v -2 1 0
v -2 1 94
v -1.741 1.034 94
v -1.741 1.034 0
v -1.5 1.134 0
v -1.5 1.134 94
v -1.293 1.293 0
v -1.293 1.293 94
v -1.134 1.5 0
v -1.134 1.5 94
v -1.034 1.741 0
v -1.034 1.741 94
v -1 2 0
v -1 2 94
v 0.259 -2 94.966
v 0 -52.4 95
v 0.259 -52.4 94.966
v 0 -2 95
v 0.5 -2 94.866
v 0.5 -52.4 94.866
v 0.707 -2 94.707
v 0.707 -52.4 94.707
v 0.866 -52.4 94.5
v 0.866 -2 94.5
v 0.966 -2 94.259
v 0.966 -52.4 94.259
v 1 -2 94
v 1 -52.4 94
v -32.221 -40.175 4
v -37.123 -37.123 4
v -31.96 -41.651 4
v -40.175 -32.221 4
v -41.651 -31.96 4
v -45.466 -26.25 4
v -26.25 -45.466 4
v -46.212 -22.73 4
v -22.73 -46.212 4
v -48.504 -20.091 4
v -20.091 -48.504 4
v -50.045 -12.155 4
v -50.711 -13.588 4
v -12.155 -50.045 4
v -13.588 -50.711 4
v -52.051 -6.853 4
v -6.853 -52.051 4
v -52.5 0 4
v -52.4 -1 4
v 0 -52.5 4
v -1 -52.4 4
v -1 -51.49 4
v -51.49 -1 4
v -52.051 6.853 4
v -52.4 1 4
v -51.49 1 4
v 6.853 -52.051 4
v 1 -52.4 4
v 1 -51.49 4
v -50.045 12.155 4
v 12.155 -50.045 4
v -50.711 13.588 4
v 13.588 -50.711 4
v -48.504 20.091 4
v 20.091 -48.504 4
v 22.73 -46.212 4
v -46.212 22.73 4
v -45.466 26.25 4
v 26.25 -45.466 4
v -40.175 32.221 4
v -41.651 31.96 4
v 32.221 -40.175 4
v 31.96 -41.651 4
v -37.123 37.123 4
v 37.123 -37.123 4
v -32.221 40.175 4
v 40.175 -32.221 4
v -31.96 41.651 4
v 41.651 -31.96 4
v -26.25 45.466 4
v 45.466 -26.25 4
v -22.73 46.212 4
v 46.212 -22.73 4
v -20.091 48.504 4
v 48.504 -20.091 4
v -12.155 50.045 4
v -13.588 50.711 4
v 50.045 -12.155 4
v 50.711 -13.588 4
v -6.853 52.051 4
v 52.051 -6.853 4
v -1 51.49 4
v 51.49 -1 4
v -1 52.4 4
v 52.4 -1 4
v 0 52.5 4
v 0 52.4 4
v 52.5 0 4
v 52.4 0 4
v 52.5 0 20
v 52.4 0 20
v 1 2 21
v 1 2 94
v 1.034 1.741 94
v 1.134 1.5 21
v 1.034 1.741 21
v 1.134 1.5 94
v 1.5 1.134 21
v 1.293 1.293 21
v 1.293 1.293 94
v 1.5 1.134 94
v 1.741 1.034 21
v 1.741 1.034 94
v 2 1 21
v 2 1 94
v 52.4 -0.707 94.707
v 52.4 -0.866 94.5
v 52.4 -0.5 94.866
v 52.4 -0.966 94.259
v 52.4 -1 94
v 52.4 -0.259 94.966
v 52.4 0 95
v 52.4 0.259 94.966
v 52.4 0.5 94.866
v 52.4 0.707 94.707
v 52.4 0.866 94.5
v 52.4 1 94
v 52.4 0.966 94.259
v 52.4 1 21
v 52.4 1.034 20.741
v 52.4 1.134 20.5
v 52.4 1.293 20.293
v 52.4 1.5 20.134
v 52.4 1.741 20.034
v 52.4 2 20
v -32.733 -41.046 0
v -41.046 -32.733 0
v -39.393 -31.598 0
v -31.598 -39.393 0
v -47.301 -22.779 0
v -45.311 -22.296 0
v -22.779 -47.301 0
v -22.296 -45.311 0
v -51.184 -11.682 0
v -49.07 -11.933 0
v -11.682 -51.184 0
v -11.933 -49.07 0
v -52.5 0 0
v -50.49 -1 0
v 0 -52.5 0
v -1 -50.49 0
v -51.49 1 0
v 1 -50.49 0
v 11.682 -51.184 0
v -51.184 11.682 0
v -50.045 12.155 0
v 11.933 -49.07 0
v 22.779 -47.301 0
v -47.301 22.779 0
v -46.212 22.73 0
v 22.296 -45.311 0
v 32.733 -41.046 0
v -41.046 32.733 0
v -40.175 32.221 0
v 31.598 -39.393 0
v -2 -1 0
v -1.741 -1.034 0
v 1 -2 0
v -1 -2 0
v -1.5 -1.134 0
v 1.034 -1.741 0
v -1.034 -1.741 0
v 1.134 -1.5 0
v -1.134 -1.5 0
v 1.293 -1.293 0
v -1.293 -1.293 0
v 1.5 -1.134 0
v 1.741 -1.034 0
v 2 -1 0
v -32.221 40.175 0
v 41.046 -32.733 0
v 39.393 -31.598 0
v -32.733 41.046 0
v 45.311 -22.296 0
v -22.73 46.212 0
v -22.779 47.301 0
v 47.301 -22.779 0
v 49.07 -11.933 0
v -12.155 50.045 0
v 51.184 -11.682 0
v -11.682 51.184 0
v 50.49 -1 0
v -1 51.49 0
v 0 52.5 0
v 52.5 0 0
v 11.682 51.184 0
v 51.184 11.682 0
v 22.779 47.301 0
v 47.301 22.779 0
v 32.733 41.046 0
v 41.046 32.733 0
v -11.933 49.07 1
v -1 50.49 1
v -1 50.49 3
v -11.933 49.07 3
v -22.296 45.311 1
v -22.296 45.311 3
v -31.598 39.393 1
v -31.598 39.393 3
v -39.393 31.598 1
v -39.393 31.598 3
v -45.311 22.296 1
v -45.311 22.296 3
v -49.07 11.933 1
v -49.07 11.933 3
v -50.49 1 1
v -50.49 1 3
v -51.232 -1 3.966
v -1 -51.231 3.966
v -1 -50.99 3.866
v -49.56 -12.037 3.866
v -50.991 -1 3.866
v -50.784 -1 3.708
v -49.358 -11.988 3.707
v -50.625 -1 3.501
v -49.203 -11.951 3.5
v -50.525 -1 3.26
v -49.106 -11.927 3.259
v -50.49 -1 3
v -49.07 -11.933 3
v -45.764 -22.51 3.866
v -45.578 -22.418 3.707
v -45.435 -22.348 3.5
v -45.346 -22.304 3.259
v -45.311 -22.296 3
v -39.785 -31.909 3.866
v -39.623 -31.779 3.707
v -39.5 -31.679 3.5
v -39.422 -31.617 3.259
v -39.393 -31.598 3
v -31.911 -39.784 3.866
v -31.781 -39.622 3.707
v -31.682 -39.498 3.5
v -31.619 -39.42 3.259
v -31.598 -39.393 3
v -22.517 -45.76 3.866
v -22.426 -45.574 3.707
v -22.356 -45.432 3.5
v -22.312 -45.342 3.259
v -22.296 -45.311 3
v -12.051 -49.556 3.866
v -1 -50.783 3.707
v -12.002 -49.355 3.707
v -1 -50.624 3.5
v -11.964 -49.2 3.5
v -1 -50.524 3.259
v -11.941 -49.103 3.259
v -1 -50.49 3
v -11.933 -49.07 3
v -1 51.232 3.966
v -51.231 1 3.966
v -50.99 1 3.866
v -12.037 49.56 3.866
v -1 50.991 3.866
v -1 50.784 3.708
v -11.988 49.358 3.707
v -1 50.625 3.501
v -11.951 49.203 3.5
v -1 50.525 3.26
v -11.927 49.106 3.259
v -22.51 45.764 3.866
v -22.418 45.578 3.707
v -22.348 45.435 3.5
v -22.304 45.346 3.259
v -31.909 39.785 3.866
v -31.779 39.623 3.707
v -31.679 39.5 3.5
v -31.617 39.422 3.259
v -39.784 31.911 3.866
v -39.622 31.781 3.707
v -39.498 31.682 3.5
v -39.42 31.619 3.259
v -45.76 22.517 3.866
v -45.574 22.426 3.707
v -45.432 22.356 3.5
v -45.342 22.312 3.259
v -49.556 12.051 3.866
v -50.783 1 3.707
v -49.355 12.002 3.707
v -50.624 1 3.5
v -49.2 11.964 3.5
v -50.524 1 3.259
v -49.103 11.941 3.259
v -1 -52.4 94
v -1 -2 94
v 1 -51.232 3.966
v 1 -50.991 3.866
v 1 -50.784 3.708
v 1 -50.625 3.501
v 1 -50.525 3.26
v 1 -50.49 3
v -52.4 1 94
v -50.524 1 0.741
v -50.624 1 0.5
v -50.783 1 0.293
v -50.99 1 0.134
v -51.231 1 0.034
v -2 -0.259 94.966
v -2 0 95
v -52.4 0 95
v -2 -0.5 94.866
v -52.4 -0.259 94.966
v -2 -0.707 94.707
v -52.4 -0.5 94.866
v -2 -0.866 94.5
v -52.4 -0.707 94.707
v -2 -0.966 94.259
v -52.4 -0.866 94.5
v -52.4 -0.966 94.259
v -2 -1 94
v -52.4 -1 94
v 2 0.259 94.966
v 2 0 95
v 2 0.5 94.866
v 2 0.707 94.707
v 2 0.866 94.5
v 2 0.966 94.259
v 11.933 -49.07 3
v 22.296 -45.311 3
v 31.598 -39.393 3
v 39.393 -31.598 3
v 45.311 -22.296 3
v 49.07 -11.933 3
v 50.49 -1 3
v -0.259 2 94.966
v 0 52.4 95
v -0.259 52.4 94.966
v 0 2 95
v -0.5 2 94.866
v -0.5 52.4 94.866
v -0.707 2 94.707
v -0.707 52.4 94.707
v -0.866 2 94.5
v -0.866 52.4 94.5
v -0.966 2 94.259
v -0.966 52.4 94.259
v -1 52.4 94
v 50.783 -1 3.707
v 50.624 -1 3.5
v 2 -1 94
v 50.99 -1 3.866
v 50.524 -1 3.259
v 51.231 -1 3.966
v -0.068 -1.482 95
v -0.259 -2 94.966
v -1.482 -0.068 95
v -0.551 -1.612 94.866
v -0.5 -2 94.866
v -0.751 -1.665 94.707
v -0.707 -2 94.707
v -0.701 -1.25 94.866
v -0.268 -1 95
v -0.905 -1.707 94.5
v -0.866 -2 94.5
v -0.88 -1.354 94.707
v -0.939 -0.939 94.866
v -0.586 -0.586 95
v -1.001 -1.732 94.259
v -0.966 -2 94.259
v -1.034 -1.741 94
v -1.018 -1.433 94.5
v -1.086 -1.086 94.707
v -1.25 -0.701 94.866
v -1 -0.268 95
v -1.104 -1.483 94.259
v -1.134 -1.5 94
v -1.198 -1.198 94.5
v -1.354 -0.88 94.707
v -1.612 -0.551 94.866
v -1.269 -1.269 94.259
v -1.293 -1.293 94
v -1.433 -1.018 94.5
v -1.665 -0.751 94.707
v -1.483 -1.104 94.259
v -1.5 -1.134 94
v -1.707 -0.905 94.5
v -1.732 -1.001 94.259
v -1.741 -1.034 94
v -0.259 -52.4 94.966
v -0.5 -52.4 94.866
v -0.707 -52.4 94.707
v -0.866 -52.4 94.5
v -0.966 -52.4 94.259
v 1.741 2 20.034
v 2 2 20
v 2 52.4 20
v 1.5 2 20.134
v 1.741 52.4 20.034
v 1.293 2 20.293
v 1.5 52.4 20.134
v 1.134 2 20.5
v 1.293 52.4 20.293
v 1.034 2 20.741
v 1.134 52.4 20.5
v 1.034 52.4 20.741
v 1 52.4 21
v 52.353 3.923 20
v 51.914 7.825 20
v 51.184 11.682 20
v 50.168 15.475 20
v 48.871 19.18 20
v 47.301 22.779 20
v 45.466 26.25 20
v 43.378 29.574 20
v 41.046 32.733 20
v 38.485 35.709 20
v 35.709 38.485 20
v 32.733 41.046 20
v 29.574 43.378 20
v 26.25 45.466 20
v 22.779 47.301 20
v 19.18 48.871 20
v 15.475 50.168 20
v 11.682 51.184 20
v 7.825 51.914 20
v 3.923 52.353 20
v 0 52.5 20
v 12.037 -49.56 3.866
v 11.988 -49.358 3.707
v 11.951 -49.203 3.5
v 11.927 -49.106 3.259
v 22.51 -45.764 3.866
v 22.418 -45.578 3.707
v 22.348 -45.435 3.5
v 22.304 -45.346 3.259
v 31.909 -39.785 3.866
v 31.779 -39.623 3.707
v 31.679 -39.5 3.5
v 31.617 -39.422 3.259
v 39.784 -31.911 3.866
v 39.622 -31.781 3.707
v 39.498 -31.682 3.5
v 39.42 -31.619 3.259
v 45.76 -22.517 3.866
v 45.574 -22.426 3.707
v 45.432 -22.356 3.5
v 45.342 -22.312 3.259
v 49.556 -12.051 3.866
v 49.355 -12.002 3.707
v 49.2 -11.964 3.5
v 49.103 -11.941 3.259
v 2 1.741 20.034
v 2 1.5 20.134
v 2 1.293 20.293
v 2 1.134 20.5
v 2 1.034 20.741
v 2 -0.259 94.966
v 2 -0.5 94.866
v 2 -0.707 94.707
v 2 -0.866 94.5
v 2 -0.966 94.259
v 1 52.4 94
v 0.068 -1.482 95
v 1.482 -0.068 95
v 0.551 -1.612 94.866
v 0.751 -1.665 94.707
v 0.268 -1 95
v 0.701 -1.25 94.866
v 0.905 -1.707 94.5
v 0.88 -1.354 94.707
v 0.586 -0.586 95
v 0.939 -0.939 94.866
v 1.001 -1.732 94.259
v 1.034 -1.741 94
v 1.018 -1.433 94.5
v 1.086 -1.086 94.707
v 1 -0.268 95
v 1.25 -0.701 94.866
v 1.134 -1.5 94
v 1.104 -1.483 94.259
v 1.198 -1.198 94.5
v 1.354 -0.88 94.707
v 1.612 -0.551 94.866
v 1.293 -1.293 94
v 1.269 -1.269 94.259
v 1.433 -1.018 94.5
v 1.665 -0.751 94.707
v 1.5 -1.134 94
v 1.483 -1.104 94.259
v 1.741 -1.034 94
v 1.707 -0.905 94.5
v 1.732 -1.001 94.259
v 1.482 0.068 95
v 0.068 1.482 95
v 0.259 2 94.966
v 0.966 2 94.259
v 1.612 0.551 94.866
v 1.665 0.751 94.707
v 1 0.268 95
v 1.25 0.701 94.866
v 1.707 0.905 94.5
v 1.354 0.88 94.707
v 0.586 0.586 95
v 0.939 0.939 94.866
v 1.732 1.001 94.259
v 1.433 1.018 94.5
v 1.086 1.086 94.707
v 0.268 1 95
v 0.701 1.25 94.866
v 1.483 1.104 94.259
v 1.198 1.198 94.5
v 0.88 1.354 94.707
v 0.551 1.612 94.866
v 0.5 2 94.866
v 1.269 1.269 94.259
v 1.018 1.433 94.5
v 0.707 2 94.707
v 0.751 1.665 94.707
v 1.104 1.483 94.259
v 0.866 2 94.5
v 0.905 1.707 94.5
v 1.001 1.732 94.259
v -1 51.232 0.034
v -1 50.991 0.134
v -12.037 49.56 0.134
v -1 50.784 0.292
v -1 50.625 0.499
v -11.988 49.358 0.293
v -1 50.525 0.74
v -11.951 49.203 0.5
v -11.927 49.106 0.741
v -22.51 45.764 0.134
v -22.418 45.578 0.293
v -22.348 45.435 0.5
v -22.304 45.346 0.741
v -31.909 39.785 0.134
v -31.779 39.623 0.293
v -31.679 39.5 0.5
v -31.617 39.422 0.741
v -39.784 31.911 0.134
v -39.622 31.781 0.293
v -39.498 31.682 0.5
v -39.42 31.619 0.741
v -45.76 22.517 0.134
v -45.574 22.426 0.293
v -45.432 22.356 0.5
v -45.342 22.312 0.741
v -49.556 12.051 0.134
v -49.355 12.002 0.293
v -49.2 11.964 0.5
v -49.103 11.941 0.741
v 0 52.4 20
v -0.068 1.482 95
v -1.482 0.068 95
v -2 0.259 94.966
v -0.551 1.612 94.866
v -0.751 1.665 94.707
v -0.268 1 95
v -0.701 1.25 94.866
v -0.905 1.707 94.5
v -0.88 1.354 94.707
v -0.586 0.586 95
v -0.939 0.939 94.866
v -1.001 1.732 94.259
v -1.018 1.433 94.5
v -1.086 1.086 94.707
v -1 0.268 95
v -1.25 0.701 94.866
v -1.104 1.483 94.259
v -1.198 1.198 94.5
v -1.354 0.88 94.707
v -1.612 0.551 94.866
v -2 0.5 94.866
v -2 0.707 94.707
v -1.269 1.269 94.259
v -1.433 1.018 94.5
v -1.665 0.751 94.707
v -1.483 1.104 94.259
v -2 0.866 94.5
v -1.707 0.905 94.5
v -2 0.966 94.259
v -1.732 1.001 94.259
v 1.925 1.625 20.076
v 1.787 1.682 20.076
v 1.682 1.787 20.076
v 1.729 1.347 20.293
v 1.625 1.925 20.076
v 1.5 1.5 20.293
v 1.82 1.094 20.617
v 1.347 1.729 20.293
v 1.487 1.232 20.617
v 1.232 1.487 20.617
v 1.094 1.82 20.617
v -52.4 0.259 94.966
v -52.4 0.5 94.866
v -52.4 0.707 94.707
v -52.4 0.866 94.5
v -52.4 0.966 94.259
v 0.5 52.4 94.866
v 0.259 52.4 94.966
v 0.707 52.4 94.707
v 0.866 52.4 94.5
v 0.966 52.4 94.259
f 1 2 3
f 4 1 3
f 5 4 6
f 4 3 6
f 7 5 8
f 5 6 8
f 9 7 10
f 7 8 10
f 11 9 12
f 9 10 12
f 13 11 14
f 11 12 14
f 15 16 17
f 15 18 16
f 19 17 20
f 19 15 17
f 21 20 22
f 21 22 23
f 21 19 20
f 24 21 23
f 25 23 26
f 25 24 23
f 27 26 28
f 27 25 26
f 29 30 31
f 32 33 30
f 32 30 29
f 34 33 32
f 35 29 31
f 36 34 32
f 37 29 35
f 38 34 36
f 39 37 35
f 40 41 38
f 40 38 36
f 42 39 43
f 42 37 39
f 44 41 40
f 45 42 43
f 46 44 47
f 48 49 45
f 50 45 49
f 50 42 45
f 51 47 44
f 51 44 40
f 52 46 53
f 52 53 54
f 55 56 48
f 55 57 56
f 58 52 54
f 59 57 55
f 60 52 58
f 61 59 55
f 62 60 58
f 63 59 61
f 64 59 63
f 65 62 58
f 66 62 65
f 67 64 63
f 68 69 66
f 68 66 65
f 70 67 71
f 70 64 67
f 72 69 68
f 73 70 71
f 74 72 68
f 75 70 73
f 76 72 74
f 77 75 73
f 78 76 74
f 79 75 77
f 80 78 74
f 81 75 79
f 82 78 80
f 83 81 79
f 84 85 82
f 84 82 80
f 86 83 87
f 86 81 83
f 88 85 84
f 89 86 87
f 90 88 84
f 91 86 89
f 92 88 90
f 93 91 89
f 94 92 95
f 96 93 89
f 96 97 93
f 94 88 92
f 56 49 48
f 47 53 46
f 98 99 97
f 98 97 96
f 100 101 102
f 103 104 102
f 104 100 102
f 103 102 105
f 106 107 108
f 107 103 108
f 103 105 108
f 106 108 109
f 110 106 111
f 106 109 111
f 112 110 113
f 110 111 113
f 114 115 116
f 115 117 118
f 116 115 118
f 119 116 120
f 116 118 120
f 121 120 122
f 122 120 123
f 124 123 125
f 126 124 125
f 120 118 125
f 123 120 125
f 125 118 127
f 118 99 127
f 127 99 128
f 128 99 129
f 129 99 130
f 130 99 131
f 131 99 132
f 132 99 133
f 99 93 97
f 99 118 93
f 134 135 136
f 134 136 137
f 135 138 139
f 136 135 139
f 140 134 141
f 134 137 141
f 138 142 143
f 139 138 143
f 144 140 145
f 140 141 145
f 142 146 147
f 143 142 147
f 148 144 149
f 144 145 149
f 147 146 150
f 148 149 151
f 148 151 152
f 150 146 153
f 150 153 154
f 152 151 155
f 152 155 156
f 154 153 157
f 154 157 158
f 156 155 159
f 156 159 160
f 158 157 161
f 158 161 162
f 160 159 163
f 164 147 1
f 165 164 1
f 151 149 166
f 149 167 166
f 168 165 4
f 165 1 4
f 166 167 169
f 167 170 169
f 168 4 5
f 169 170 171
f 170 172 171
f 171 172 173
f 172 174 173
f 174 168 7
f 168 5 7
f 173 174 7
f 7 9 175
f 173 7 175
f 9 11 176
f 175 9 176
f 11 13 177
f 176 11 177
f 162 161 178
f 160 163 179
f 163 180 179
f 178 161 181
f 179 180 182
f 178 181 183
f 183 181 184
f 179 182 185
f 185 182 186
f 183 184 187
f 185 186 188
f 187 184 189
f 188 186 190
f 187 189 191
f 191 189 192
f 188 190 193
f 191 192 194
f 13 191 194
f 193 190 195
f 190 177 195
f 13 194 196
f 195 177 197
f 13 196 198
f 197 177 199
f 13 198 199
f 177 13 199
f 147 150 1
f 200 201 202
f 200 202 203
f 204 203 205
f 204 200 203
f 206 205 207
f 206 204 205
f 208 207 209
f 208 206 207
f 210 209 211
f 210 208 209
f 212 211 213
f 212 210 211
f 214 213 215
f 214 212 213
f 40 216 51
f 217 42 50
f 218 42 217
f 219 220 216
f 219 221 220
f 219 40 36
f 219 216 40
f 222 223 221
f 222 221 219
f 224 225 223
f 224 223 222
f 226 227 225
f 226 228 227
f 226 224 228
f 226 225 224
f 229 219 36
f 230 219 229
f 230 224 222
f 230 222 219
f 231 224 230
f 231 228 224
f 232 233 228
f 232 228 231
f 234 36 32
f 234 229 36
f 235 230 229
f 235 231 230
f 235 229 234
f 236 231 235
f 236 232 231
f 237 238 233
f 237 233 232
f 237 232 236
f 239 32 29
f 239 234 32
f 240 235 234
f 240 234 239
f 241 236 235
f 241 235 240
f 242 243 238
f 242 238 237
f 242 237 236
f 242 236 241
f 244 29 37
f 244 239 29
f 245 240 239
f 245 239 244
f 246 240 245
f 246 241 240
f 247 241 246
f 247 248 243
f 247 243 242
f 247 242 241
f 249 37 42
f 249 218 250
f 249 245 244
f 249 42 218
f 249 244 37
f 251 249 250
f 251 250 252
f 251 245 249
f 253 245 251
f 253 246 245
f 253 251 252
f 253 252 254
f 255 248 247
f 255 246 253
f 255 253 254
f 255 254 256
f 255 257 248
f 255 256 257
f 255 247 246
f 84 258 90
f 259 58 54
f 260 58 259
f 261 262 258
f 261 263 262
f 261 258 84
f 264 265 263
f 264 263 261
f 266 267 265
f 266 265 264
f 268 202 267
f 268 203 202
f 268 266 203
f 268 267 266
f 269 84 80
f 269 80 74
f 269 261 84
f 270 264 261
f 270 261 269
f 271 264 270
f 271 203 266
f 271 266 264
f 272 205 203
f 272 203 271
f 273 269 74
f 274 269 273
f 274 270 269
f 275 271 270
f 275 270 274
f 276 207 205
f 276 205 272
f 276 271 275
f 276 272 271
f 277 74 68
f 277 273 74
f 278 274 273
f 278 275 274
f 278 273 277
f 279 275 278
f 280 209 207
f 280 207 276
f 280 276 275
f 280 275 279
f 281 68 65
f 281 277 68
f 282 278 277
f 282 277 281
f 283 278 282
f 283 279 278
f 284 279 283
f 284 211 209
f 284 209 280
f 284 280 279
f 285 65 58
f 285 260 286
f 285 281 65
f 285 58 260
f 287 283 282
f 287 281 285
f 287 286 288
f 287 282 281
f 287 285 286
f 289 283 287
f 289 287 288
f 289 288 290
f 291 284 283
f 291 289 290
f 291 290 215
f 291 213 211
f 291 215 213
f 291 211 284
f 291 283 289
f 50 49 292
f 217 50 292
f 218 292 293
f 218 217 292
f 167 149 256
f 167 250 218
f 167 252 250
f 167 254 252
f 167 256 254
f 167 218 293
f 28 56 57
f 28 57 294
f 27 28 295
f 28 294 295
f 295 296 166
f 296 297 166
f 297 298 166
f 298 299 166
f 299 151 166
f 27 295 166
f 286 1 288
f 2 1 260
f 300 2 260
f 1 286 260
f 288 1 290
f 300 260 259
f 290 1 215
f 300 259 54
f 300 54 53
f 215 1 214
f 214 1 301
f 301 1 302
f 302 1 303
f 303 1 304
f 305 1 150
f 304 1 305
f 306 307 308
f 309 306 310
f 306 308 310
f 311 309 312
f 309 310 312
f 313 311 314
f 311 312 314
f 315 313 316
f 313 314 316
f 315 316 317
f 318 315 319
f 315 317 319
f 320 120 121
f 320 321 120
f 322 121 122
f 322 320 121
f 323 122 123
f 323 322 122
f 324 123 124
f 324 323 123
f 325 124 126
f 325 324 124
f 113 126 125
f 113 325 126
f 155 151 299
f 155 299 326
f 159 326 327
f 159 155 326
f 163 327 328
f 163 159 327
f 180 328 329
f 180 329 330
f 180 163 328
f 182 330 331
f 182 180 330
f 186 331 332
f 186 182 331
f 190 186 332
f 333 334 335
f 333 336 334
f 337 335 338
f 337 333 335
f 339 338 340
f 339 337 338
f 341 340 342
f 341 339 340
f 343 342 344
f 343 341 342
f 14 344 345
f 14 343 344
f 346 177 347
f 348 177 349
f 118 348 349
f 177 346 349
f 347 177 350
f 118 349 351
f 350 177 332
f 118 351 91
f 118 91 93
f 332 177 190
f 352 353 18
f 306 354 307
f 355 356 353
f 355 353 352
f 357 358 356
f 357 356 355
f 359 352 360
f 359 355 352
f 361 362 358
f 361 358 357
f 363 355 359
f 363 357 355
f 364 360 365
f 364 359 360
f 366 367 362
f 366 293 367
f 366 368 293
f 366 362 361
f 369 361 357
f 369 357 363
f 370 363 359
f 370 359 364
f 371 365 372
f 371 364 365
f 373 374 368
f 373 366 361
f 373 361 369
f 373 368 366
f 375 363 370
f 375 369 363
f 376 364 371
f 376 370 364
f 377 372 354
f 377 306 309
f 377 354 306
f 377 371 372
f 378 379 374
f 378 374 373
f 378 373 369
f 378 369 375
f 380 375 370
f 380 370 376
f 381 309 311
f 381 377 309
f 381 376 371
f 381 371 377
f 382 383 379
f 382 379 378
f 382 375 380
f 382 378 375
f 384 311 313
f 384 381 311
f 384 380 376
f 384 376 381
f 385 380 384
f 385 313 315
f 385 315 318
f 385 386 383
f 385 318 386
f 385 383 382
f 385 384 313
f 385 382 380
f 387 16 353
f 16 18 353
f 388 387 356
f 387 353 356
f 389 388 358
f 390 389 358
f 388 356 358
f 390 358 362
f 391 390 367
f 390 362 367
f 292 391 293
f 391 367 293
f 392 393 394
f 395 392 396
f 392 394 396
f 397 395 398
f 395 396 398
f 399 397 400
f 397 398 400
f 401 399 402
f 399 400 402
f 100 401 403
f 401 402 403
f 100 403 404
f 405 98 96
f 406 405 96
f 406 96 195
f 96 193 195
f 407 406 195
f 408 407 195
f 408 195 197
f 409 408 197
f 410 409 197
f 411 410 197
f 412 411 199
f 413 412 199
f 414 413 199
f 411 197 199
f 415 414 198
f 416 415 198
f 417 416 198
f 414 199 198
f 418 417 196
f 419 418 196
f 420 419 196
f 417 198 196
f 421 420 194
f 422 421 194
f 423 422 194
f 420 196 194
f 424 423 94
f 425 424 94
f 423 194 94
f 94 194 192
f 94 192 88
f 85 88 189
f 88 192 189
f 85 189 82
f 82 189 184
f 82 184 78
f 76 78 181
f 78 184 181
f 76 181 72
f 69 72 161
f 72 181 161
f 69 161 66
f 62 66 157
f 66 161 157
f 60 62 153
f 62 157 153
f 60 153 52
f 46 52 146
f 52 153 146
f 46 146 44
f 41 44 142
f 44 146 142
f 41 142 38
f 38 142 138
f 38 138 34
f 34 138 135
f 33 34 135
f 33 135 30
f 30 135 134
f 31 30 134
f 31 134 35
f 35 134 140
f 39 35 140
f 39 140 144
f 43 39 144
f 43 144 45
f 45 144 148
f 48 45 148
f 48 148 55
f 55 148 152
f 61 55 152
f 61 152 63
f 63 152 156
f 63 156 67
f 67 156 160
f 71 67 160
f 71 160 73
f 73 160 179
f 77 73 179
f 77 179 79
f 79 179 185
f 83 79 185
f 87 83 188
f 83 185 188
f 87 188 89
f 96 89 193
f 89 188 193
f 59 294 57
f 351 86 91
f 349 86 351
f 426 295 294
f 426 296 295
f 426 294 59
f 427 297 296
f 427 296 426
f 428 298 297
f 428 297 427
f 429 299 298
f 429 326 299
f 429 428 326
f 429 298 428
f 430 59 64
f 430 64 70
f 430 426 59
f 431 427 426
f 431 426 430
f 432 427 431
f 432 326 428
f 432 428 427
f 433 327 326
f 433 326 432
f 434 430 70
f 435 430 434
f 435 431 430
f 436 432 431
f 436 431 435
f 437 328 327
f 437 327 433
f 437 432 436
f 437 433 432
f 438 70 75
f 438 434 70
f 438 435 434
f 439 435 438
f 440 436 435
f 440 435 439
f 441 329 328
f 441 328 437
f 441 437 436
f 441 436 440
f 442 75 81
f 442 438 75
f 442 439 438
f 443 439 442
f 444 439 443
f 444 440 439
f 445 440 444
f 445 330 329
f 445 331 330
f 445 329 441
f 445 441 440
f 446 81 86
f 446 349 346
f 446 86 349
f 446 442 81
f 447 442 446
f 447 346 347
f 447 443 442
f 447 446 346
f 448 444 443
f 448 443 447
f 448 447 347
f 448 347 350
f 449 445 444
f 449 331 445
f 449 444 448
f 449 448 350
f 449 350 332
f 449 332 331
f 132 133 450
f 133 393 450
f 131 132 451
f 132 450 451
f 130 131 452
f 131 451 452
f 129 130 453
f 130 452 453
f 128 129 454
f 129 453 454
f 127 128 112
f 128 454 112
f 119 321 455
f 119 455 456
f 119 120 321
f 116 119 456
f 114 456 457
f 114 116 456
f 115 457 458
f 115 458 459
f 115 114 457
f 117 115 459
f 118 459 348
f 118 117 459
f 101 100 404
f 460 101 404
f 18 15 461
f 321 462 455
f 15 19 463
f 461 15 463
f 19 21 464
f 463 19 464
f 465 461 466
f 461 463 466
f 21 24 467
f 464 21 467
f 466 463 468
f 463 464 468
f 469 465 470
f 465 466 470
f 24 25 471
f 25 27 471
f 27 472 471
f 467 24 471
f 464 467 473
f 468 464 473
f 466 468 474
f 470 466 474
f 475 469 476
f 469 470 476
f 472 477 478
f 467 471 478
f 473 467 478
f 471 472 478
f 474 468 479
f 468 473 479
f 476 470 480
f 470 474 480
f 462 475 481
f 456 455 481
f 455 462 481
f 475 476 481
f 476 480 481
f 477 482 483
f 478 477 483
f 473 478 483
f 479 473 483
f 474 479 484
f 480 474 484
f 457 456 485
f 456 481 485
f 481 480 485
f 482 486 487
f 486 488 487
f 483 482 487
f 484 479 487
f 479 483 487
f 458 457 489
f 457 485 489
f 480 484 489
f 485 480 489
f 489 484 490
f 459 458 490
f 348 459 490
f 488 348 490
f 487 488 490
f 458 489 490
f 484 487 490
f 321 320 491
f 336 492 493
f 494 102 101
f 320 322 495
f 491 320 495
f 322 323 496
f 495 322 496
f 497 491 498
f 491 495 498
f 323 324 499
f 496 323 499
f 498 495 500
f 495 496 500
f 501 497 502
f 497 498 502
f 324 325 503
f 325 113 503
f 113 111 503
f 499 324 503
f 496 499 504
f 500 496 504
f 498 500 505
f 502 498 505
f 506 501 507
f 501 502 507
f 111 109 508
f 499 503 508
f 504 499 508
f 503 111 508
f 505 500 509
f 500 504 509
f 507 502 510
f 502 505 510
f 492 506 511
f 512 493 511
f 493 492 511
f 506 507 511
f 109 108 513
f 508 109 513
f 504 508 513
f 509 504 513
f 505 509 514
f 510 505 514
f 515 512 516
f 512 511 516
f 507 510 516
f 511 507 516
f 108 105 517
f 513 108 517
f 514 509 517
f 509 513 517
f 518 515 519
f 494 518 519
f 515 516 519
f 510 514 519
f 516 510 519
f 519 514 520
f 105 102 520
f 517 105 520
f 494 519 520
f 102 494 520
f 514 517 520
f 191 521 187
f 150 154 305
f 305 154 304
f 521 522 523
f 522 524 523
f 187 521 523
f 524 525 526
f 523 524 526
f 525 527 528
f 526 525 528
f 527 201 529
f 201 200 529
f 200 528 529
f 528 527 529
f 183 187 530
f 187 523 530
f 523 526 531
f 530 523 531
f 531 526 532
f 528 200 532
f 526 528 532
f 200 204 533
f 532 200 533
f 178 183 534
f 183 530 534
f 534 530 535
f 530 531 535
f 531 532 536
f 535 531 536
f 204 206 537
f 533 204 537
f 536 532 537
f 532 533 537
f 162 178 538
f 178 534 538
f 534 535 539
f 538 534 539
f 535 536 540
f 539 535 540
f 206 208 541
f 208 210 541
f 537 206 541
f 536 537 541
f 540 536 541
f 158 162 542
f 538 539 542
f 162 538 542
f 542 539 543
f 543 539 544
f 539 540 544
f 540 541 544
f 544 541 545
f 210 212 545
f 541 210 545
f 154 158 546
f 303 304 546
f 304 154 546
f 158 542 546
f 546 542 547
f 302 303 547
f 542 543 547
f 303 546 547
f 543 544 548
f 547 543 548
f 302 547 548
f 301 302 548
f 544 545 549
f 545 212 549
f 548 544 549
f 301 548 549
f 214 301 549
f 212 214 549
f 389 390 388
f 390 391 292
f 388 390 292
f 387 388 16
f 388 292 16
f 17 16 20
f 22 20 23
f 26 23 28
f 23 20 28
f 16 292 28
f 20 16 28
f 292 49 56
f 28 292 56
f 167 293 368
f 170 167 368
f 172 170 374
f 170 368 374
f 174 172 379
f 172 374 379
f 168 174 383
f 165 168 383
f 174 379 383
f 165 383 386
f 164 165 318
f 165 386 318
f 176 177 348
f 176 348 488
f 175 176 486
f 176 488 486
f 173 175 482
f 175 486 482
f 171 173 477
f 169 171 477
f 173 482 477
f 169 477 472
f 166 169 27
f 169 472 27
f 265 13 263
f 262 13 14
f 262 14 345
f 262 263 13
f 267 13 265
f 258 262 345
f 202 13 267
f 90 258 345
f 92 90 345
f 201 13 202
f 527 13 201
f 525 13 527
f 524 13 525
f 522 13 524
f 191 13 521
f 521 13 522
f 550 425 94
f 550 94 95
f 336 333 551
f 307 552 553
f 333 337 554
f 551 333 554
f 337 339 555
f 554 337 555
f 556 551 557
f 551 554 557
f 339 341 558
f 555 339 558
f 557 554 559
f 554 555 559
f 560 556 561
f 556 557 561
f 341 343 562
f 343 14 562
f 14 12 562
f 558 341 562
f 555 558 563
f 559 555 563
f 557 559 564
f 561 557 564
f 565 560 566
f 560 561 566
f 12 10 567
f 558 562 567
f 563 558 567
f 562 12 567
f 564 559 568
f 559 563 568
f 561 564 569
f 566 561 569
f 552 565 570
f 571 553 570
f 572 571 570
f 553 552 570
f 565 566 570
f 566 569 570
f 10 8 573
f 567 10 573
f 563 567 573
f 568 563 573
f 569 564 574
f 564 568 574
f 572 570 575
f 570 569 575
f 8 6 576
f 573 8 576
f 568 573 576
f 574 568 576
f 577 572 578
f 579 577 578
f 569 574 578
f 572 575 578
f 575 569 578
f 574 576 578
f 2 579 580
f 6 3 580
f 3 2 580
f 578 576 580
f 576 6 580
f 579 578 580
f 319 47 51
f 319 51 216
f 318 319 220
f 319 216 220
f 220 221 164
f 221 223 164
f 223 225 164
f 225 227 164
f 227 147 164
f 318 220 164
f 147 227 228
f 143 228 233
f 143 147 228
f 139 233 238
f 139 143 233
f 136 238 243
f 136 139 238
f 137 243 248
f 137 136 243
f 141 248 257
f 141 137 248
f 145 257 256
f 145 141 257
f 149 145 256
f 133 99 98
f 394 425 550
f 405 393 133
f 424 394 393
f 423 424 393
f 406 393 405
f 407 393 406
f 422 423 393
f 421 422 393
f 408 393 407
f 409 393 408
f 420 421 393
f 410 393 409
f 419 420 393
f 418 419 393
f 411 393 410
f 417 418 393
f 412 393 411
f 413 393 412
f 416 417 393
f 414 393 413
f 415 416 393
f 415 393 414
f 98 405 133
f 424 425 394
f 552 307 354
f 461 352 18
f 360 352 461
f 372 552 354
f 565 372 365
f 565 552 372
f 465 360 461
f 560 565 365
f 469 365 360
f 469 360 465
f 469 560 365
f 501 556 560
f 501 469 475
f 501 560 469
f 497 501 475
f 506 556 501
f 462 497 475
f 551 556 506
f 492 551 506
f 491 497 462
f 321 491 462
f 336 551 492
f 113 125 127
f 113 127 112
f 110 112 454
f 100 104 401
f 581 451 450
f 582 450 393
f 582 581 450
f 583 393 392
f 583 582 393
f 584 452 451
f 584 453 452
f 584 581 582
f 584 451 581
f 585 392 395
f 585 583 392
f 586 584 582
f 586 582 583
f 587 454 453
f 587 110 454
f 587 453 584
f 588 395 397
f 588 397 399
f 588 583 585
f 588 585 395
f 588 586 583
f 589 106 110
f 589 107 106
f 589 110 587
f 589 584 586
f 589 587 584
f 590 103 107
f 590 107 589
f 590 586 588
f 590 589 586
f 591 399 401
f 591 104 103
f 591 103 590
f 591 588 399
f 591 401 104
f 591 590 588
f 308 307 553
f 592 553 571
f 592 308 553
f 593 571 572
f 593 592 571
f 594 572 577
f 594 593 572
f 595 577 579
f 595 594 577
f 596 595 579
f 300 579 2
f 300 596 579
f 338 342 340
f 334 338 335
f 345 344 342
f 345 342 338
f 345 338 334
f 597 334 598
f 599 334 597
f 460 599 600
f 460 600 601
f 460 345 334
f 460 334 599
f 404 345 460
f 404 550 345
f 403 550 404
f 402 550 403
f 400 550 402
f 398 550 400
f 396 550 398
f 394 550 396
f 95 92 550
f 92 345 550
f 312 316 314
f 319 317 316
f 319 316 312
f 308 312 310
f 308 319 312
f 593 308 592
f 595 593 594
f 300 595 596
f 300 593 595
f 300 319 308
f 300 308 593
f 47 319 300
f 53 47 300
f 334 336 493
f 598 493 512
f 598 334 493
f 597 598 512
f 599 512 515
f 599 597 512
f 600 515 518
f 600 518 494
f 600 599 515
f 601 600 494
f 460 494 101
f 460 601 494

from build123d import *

# Parameters (mm, degrees)
F0_R     = 52.5
F0_R_2   = 50.5
F1_DEPTH = 4
F2_W     = 2
F2_H     = 51.4
F2_W_2   = 51.4
F2_H_2   = 2
F3_DEPTH = 95
F5_DEPTH = 20
F6_F1_R  = 1
F6_F2_R  = 1
F6_F3_R  = 0.9999
F7_R     = 0.99999


# Not quite as in the source:
# - a fillet or chamfer is up to 0.001 mm smaller than in the source, because OpenCascade refuses the exact size


with BuildPart() as f1:
    # F0 (on Top) → F1 (new body)
    with BuildSketch(Plane.XY):
        Circle(F0_R)
        Circle(F0_R_2, mode=Mode.SUBTRACT)
    extrude(amount=F1_DEPTH)

    # F2 (on Top) → F3 (join)
    with BuildSketch(Plane.XY):
        with Locations((0, -26.7)):
            Rectangle(F2_W, F2_H)
        with Locations((-26.7, 0)):
            Rectangle(F2_W_2, F2_H_2)
        Rectangle(F2_W, F2_H_2)
        with Locations((26.7, 0)):
            Rectangle(F2_W_2, F2_H_2)
        with Locations((0, 26.7)):
            Rectangle(F2_W, F2_H)
    extrude(amount=F3_DEPTH)

    # F4 (on Top) → F5 (join)
    with BuildSketch(Plane.XY):
        with BuildLine():
            Line((0, 0), (52.5, 0))
            ThreePointArc((52.5, 0), (37.1231060123, 37.1231060123), (0, 52.5))
            Line((0, 52.5), (0, 0))
        make_face()
    extrude(amount=F5_DEPTH)

    # F6: fillet of radius 1 on 13 edges, made by hand

    # F6_f1
    f6_f1_edges = [f1.edges().sort_by_distance(p)[0] for p in [
        (1, 1, 57.5),
        (26.7, 1, 20),
        (1, 26.7, 20),
        (-1, 1, 47.5),
        (1, -1, 47.5),
        (-1, -1, 47.5),
    ]]
    fillet(f6_f1_edges, radius=F6_F1_R)

    # F6_f2
    f6_f2_edges = [f1.edges().sort_by_distance(p)[0] for p in [
        (-27.2, 1, 95),
        (-35.7088924499, -35.7088924499, 4),
        (35.7088924499, -35.7088924499, 4),
        (-35.7088924499, 35.7088924499, 0),
        (-35.7088924499, 35.7088924499, 4),
        (-1.2928932188, 1.2928932188, 95),
    ]]
    fillet(f6_f2_edges, radius=F6_F2_R)

    # F6_f3 (radius 1 in the source; OpenCascade refuses exactly that, so slightly less here)
    f6_f3_edges = [f1.edges().sort_by_distance(p)[0] for p in [
        (1, 27.2, 95),
        (27.2, 1, 95),
        (1.2928932188, 1.2928932188, 95),
    ]]
    fillet(f6_f3_edges, radius=F6_F3_R)

    # F7 (radius 1 in the source; OpenCascade refuses exactly that, so slightly less here)
    f7_edges = [f1.edges().sort_by_distance(p)[0] for p in [
        (1, -27.2, 95),
        (-1, -27.2, 95),
        (-27.2, -1, 95),
        (27.2, -1, 95),
        (1.292893, -1.292893, 95),
        (-1.292893, -1.292893, 95),
    ]]
    fillet(f7_edges, radius=F7_R)


solid = f1.part
